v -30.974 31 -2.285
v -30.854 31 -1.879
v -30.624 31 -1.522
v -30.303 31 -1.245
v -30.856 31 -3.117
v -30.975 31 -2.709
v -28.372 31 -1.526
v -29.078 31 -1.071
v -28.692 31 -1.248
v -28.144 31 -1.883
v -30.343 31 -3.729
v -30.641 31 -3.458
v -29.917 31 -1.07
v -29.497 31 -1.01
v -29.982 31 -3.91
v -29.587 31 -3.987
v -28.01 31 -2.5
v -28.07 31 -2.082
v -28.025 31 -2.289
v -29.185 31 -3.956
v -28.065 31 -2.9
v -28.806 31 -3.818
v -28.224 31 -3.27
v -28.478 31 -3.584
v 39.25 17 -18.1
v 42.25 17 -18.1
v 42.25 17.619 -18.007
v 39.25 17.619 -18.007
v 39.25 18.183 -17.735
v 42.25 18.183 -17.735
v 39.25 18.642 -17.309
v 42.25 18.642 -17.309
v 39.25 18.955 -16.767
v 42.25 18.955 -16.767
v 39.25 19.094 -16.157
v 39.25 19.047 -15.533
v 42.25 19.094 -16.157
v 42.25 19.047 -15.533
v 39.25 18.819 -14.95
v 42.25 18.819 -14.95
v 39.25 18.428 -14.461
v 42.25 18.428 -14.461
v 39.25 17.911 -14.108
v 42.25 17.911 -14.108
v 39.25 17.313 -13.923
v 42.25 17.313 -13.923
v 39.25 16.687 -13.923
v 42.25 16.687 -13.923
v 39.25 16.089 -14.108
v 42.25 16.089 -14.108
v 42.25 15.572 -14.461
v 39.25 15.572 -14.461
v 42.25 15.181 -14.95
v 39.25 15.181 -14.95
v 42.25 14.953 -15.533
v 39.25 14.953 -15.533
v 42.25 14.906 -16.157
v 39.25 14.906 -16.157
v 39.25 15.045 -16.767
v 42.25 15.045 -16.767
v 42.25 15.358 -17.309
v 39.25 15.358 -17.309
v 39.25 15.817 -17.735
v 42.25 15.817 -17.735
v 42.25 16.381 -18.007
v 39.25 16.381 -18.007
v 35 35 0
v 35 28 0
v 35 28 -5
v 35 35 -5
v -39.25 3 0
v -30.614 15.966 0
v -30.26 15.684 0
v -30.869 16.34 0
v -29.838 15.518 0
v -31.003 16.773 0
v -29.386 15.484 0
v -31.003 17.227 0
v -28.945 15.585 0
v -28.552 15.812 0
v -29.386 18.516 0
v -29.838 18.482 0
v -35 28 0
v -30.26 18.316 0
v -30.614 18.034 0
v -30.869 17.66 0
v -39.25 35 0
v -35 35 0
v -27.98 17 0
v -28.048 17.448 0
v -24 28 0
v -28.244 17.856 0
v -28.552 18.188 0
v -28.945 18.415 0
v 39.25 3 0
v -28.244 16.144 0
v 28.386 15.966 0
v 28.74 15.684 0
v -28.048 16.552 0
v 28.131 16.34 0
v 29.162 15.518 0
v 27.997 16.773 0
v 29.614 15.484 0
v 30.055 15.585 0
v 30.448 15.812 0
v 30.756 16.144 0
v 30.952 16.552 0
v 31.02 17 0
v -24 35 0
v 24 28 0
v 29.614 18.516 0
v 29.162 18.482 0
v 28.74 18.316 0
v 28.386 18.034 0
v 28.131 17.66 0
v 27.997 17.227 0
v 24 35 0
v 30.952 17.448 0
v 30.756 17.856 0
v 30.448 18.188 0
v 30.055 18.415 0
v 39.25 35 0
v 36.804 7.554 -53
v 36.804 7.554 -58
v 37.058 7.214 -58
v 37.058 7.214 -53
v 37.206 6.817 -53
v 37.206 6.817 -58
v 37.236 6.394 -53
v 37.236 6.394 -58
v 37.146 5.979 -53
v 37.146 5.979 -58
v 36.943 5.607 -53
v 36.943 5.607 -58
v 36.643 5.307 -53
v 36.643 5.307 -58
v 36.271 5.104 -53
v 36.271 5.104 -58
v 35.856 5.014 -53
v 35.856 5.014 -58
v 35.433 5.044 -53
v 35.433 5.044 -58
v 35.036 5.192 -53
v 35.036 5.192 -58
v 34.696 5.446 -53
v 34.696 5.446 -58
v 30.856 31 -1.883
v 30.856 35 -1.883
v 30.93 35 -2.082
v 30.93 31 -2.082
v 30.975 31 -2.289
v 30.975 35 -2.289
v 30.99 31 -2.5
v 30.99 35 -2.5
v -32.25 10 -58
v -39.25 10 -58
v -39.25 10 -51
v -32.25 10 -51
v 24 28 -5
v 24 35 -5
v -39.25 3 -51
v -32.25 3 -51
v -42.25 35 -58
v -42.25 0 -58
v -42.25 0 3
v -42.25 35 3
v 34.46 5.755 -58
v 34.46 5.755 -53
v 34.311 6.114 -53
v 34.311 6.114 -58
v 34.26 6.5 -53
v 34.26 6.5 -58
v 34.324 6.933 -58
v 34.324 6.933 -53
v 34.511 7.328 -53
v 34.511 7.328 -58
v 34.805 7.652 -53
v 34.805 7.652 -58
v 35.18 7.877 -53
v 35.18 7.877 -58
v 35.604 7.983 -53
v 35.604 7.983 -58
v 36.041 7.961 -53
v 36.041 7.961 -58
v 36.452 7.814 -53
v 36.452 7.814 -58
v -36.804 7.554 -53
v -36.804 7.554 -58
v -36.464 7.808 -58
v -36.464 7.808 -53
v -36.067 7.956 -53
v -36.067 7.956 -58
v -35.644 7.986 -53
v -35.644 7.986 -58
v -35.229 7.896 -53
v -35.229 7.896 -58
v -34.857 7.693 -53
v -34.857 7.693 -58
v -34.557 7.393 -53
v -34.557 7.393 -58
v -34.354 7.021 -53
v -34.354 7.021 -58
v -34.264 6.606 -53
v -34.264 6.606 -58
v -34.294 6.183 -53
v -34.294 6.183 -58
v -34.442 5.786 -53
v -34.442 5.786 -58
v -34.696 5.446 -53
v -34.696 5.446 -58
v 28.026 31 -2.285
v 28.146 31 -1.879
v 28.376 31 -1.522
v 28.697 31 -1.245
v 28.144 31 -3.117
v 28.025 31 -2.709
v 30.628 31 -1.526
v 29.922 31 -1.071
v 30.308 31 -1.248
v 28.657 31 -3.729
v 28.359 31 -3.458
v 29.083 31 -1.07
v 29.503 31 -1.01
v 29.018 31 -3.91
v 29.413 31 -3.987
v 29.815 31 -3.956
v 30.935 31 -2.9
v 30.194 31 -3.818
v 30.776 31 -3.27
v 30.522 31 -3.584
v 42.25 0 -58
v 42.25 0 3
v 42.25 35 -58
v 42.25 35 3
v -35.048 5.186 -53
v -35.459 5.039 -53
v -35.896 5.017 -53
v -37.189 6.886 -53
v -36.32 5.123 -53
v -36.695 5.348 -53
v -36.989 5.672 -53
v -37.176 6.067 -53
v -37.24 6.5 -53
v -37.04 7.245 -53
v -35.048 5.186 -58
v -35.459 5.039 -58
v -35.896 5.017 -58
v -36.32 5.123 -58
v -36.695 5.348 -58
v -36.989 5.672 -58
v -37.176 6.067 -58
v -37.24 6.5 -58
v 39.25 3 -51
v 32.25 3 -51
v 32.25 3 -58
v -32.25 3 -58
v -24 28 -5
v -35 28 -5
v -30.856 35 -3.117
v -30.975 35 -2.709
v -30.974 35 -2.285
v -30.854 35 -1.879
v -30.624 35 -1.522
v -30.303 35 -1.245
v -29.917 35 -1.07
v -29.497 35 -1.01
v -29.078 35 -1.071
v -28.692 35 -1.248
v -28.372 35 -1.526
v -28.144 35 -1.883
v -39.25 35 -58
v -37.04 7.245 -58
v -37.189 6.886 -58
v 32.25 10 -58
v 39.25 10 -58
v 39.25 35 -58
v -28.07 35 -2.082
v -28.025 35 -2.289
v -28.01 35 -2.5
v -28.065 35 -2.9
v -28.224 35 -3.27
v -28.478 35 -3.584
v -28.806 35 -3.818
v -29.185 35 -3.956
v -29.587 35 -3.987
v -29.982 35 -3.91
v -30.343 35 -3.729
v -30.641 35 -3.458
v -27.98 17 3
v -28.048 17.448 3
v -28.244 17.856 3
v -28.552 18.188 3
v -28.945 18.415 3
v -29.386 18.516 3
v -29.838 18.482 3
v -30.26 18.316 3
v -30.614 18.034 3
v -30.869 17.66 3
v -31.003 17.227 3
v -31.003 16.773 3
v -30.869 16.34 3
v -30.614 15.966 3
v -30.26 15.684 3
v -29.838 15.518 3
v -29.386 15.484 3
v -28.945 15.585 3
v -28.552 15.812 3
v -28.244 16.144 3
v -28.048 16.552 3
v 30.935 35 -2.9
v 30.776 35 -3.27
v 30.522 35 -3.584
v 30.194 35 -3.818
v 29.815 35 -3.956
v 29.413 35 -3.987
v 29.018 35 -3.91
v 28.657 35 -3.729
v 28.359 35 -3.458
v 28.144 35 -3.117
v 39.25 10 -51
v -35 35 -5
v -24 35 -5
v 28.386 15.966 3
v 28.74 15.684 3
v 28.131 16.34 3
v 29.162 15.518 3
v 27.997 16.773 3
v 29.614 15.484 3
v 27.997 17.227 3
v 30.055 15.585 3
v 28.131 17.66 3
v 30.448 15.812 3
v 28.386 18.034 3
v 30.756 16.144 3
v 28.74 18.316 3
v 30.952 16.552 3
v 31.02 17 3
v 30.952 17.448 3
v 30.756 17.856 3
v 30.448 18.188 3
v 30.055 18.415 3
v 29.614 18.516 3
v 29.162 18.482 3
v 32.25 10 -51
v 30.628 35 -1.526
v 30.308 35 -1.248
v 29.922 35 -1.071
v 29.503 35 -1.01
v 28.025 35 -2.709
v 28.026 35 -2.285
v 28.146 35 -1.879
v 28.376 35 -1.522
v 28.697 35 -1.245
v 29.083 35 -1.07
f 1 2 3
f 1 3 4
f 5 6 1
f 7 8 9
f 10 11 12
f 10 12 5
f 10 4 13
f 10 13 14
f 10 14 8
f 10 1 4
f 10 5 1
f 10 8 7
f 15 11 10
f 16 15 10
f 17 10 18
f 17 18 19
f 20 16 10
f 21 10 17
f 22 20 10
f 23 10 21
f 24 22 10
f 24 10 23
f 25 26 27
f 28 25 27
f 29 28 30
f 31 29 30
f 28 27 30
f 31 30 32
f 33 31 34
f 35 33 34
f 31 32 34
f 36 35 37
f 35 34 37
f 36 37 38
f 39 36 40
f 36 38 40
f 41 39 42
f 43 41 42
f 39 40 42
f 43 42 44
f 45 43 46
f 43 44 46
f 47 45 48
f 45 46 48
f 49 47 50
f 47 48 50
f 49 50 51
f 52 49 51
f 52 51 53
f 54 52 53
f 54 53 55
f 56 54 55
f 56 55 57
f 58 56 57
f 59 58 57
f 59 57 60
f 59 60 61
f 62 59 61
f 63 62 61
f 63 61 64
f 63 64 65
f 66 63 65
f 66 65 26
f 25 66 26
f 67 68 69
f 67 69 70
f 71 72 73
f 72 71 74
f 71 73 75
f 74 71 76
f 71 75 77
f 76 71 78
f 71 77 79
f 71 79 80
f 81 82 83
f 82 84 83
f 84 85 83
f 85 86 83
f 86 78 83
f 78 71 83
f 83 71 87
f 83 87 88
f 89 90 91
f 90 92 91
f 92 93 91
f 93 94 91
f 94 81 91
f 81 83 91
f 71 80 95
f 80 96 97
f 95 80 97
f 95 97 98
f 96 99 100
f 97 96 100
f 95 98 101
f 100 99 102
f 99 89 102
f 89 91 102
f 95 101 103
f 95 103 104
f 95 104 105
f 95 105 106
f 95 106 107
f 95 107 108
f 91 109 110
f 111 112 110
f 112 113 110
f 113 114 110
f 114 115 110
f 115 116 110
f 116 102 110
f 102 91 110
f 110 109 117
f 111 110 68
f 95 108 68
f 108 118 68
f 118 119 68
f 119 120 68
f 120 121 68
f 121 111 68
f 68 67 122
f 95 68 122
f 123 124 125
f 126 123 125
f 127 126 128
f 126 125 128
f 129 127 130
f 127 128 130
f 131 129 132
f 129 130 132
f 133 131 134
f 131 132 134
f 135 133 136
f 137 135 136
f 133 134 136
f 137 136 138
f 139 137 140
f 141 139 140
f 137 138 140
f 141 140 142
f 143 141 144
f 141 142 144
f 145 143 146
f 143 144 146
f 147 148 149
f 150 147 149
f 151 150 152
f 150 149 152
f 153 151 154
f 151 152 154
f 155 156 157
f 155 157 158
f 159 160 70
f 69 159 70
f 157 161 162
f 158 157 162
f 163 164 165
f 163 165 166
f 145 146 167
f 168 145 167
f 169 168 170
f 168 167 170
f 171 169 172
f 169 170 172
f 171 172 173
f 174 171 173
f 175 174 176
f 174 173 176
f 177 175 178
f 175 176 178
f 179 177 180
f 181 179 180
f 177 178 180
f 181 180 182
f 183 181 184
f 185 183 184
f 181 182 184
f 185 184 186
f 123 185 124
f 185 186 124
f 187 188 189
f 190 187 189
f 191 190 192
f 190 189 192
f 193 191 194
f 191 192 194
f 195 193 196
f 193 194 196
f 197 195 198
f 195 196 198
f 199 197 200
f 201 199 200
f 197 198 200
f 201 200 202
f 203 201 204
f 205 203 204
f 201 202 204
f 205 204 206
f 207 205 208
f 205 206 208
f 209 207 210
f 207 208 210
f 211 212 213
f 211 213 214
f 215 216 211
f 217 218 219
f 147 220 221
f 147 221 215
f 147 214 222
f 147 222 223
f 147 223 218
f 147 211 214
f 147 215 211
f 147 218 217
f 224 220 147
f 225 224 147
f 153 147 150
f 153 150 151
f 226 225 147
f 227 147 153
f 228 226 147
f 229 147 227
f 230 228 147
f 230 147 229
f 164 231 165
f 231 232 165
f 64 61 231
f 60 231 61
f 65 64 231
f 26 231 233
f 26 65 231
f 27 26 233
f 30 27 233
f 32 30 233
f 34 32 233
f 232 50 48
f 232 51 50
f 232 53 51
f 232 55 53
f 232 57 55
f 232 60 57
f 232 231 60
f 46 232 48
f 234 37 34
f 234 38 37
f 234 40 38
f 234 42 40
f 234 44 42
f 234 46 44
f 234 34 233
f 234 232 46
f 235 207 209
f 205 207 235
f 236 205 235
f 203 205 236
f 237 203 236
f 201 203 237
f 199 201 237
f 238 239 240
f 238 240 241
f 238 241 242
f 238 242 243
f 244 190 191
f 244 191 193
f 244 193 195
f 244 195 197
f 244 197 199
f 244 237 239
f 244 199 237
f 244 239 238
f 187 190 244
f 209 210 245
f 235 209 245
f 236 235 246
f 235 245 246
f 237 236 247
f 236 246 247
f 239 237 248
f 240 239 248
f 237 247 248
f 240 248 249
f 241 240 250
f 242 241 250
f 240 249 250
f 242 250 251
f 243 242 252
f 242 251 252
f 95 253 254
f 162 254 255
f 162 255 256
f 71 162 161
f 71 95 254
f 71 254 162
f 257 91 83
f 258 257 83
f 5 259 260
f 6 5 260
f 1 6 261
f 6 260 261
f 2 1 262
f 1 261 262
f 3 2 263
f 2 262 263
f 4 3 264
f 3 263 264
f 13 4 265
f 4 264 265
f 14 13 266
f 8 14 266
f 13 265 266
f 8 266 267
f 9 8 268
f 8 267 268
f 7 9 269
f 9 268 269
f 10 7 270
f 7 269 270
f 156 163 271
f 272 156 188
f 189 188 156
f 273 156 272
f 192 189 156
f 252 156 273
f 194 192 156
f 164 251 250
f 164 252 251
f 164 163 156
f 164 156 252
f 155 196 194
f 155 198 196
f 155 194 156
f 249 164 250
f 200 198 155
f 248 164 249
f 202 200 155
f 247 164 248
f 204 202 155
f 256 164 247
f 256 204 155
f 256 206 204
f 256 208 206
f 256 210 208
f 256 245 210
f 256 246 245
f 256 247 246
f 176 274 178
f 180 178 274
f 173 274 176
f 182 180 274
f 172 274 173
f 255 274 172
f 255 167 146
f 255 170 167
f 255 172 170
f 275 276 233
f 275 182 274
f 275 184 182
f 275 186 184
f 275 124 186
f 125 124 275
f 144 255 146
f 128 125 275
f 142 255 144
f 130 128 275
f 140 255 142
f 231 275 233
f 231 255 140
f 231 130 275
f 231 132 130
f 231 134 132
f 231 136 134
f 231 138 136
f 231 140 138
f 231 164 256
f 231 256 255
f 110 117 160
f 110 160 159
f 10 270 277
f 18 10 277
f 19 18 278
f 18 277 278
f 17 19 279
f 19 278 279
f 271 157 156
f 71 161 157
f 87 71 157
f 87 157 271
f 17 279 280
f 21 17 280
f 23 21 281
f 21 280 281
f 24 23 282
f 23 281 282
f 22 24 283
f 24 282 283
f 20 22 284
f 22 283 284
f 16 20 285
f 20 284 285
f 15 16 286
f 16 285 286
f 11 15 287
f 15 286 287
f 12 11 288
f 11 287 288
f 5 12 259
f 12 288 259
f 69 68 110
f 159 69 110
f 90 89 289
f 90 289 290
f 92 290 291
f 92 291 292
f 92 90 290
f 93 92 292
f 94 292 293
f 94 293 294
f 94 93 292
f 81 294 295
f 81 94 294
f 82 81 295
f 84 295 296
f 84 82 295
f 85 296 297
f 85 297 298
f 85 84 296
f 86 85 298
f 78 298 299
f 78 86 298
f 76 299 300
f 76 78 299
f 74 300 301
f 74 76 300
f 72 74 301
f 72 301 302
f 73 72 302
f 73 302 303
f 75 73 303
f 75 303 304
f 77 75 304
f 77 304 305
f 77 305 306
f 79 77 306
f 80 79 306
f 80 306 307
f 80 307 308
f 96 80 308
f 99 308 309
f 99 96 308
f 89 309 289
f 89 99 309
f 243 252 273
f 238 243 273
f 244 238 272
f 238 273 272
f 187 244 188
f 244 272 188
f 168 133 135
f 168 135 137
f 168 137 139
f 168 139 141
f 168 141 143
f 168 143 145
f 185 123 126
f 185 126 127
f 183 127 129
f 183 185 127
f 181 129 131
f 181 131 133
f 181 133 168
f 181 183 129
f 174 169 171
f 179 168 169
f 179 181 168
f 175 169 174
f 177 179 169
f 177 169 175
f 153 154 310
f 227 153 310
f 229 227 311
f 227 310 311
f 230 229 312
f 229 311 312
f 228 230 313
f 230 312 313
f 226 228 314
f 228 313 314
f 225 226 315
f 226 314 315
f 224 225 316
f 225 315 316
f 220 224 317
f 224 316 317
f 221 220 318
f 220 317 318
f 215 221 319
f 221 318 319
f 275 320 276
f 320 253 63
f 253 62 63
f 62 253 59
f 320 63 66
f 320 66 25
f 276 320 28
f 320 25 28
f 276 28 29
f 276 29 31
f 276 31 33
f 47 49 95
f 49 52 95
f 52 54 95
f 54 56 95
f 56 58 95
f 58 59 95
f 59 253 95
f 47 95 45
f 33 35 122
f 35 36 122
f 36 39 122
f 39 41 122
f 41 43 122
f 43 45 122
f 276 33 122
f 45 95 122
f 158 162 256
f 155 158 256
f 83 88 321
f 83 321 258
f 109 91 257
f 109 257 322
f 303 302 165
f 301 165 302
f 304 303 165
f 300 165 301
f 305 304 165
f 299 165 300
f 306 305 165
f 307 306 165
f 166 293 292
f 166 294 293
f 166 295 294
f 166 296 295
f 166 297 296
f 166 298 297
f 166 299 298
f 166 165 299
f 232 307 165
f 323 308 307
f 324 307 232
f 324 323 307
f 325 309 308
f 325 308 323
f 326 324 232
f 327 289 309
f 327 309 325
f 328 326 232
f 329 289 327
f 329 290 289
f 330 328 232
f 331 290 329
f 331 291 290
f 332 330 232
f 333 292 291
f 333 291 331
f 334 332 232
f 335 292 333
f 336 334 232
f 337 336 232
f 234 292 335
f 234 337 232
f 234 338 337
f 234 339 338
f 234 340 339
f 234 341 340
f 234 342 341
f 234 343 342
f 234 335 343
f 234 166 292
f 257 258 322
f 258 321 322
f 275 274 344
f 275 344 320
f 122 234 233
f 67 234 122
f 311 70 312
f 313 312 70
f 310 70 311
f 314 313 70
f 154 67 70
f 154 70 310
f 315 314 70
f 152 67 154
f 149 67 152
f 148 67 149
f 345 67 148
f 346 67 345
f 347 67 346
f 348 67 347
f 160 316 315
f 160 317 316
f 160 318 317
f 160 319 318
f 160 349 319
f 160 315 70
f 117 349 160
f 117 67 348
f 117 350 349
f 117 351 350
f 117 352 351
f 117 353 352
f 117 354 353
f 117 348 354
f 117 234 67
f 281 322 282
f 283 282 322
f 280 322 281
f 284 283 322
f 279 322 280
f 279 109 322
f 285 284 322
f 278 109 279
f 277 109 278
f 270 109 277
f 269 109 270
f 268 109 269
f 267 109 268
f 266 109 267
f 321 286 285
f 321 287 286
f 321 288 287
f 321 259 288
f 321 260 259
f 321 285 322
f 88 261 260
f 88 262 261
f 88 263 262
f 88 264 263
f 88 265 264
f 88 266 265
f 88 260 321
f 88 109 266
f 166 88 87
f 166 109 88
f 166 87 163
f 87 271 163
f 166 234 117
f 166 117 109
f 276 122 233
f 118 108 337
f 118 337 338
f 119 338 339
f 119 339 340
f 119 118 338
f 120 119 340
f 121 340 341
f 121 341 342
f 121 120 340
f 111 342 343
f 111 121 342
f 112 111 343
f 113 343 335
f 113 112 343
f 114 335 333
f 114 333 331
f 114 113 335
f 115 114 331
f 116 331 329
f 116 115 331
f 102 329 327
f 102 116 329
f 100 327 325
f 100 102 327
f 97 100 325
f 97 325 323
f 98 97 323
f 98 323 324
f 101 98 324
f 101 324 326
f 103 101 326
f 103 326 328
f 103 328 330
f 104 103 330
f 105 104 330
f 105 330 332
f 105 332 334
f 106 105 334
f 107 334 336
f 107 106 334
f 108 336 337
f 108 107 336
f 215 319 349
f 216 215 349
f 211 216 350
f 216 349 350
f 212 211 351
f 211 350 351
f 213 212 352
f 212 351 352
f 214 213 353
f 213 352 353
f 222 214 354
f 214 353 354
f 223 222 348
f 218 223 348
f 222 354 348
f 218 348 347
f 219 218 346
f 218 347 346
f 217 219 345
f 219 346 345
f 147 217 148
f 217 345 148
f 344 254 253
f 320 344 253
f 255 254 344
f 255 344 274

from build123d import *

# Parameters (mm, degrees)
SKETCH_1_R          = 1.52
EXTRUDE_2_DEPTH     = 3
SKETCH_2_W          = 84.5
SKETCH_2_H          = 3
EXTRUDE_3_DEPTH     = 58
SKETCH_3_W          = 3
SKETCH_3_H          = 32
EXTRUDE_4_DEPTH     = 58
SKETCH_5_R          = 2.1
CUT_EXTRUDE_1_DEPTH = 58
EXTRUDE_9_DEPTH     = 5
CUT_EXTRUDE_4_DEPTH = 4
SKETCH_15_W         = 7
SKETCH_15_H         = 7
EXTRUDE_10_DEPTH    = 7
CUT_EXTRUDE_5_DEPTH = 5


with BuildPart() as part:
    # 草图1 → 凸台-拉伸2 (new body)
    with BuildSketch(Plane.XY):
        Polygon((0, 0), (42.25, 0), (42.25, 35), (0, 35), (-42.25, 35), (-42.25, 0), align=None)
        with Locations((-29.5, 17)):
            Circle(SKETCH_1_R, mode=Mode.SUBTRACT)
        with Locations((29.5, 17)):
            Circle(SKETCH_1_R, mode=Mode.SUBTRACT)
    extrude(amount=EXTRUDE_2_DEPTH)

    # 草图2 → 凸台-拉伸3 (add)
    with BuildSketch(Plane(origin=(0, 0, 0), x_dir=(-1, 0, 0), z_dir=(0, 0, -1))):
        with Locations((0, 1.5)):
            Rectangle(SKETCH_2_W, SKETCH_2_H)
    extrude(amount=EXTRUDE_3_DEPTH)

    # 草图3 → 凸台-拉伸4 (add)
    with BuildSketch(Plane(origin=(0, 0, 0), x_dir=(-1, 0, 0), z_dir=(0, 0, -1))):
        with Locations((40.75, 19)):
            Rectangle(SKETCH_3_W, SKETCH_3_H)
        with Locations((-40.75, 19)):
            Rectangle(SKETCH_3_W, SKETCH_3_H)
    extrude(amount=EXTRUDE_4_DEPTH)

    # 草图5 → 切除-拉伸1 (cut)
    with BuildSketch(Plane(origin=(42.25, 0, 0), x_dir=(0, 0, -1), z_dir=(1, 0, 0))):
        with Locations((16, 17)):
            Circle(SKETCH_5_R)
    extrude(amount=-CUT_EXTRUDE_1_DEPTH, mode=Mode.SUBTRACT)

    # 草图12 → 凸台-拉伸9 (add)
    with BuildSketch(Plane(origin=(0, 0, 0), x_dir=(-1, 0, 0), z_dir=(0, 0, -1))):
        Polygon((-35, 28), (-35, 35), (-24, 35), (-24, 28), (-29.5, 28), align=None)
        Polygon((29.5, 28), (24, 28), (24, 35), (35, 35), (35, 28), align=None)
    extrude(amount=EXTRUDE_9_DEPTH)

    # 草图14 → 切除-拉伸4 (cut)
    with BuildSketch(Plane(origin=(0, 35, 0), x_dir=(1, 0, 0), z_dir=(0, 1, 0))):
        with BuildLine():
            ThreePointArc((-28.01, 2.5), (-29.184567453, 3.956228797), (-30.856446051, 3.116566387))
            Line((-30.856446051, 3.116566387), (-28.143553949, 1.883433613))
            ThreePointArc((-28.143553949, 1.883433613), (-28.043771203, 2.184567453), (-28.01, 2.5))
        make_face()
        with BuildLine():
            Line((-28.143553949, 1.883433613), (-30.856446051, 3.116566387))
            ThreePointArc((-30.856446051, 3.116566387), (-30.116566387, 1.143553949), (-28.143553949, 1.883433613))
        make_face()
        with BuildLine():
            ThreePointArc((30.99, 2.5), (29.815432547, 3.956228797), (28.143553949, 3.116566387))
            Line((28.143553949, 3.116566387), (30.856446051, 1.883433613))
            ThreePointArc((30.856446051, 1.883433613), (30.956228797, 2.184567453), (30.99, 2.5))
        make_face()
        with BuildLine():
            Line((30.856446051, 1.883433613), (28.143553949, 3.116566387))
            ThreePointArc((28.143553949, 3.116566387), (28.883433613, 1.143553949), (30.856446051, 1.883433613))
        make_face()
    extrude(amount=-CUT_EXTRUDE_4_DEPTH, mode=Mode.SUBTRACT)

    # 草图15 → 凸台-拉伸10 (add)
    with BuildSketch(Plane(origin=(0, 3, 0), x_dir=(1, 0, 0), z_dir=(0, 1, 0))):
        with Locations((35.75, 54.5)):
            Rectangle(SKETCH_15_W, SKETCH_15_H)
        with Locations((-35.75, 54.5)):
            Rectangle(SKETCH_15_W, SKETCH_15_H)
    extrude(amount=EXTRUDE_10_DEPTH)

    # 草图16 → 切除-拉伸5 (cut)
    with BuildSketch(Plane(origin=(0, 0, -58), x_dir=(-1, 0, 0), z_dir=(0, 0, -1))):
        with BuildLine():
            ThreePointArc((-34.26, 6.5), (-35.179801686, 7.876580503), (-36.803589104, 7.553589104))
            Line((-36.803589104, 7.553589104), (-34.696410896, 5.446410896))
            ThreePointArc((-34.696410896, 5.446410896), (-34.373419497, 5.929801686), (-34.26, 6.5))
        make_face()
        with BuildLine():
            Line((-34.696410896, 5.446410896), (-36.803589104, 7.553589104))
            ThreePointArc((-36.803589104, 7.553589104), (-36.803589104, 5.446410896), (-34.696410896, 5.446410896))
        make_face()
        with BuildLine():
            ThreePointArc((36.803589104, 7.553589104), (34.696410896, 7.553589104), (34.696410896, 5.446410896))
            Line((34.696410896, 5.446410896), (36.803589104, 7.553589104))
        make_face()
        with BuildLine():
            Line((36.803589104, 7.553589104), (34.696410896, 5.446410896))
            ThreePointArc((34.696410896, 5.446410896), (36.320198314, 5.123419497), (37.24, 6.5))
            ThreePointArc((37.24, 6.5), (37.126580503, 7.070198314), (36.803589104, 7.553589104))
        make_face()
    extrude(amount=-CUT_EXTRUDE_5_DEPTH, mode=Mode.SUBTRACT)


solid = part.part
